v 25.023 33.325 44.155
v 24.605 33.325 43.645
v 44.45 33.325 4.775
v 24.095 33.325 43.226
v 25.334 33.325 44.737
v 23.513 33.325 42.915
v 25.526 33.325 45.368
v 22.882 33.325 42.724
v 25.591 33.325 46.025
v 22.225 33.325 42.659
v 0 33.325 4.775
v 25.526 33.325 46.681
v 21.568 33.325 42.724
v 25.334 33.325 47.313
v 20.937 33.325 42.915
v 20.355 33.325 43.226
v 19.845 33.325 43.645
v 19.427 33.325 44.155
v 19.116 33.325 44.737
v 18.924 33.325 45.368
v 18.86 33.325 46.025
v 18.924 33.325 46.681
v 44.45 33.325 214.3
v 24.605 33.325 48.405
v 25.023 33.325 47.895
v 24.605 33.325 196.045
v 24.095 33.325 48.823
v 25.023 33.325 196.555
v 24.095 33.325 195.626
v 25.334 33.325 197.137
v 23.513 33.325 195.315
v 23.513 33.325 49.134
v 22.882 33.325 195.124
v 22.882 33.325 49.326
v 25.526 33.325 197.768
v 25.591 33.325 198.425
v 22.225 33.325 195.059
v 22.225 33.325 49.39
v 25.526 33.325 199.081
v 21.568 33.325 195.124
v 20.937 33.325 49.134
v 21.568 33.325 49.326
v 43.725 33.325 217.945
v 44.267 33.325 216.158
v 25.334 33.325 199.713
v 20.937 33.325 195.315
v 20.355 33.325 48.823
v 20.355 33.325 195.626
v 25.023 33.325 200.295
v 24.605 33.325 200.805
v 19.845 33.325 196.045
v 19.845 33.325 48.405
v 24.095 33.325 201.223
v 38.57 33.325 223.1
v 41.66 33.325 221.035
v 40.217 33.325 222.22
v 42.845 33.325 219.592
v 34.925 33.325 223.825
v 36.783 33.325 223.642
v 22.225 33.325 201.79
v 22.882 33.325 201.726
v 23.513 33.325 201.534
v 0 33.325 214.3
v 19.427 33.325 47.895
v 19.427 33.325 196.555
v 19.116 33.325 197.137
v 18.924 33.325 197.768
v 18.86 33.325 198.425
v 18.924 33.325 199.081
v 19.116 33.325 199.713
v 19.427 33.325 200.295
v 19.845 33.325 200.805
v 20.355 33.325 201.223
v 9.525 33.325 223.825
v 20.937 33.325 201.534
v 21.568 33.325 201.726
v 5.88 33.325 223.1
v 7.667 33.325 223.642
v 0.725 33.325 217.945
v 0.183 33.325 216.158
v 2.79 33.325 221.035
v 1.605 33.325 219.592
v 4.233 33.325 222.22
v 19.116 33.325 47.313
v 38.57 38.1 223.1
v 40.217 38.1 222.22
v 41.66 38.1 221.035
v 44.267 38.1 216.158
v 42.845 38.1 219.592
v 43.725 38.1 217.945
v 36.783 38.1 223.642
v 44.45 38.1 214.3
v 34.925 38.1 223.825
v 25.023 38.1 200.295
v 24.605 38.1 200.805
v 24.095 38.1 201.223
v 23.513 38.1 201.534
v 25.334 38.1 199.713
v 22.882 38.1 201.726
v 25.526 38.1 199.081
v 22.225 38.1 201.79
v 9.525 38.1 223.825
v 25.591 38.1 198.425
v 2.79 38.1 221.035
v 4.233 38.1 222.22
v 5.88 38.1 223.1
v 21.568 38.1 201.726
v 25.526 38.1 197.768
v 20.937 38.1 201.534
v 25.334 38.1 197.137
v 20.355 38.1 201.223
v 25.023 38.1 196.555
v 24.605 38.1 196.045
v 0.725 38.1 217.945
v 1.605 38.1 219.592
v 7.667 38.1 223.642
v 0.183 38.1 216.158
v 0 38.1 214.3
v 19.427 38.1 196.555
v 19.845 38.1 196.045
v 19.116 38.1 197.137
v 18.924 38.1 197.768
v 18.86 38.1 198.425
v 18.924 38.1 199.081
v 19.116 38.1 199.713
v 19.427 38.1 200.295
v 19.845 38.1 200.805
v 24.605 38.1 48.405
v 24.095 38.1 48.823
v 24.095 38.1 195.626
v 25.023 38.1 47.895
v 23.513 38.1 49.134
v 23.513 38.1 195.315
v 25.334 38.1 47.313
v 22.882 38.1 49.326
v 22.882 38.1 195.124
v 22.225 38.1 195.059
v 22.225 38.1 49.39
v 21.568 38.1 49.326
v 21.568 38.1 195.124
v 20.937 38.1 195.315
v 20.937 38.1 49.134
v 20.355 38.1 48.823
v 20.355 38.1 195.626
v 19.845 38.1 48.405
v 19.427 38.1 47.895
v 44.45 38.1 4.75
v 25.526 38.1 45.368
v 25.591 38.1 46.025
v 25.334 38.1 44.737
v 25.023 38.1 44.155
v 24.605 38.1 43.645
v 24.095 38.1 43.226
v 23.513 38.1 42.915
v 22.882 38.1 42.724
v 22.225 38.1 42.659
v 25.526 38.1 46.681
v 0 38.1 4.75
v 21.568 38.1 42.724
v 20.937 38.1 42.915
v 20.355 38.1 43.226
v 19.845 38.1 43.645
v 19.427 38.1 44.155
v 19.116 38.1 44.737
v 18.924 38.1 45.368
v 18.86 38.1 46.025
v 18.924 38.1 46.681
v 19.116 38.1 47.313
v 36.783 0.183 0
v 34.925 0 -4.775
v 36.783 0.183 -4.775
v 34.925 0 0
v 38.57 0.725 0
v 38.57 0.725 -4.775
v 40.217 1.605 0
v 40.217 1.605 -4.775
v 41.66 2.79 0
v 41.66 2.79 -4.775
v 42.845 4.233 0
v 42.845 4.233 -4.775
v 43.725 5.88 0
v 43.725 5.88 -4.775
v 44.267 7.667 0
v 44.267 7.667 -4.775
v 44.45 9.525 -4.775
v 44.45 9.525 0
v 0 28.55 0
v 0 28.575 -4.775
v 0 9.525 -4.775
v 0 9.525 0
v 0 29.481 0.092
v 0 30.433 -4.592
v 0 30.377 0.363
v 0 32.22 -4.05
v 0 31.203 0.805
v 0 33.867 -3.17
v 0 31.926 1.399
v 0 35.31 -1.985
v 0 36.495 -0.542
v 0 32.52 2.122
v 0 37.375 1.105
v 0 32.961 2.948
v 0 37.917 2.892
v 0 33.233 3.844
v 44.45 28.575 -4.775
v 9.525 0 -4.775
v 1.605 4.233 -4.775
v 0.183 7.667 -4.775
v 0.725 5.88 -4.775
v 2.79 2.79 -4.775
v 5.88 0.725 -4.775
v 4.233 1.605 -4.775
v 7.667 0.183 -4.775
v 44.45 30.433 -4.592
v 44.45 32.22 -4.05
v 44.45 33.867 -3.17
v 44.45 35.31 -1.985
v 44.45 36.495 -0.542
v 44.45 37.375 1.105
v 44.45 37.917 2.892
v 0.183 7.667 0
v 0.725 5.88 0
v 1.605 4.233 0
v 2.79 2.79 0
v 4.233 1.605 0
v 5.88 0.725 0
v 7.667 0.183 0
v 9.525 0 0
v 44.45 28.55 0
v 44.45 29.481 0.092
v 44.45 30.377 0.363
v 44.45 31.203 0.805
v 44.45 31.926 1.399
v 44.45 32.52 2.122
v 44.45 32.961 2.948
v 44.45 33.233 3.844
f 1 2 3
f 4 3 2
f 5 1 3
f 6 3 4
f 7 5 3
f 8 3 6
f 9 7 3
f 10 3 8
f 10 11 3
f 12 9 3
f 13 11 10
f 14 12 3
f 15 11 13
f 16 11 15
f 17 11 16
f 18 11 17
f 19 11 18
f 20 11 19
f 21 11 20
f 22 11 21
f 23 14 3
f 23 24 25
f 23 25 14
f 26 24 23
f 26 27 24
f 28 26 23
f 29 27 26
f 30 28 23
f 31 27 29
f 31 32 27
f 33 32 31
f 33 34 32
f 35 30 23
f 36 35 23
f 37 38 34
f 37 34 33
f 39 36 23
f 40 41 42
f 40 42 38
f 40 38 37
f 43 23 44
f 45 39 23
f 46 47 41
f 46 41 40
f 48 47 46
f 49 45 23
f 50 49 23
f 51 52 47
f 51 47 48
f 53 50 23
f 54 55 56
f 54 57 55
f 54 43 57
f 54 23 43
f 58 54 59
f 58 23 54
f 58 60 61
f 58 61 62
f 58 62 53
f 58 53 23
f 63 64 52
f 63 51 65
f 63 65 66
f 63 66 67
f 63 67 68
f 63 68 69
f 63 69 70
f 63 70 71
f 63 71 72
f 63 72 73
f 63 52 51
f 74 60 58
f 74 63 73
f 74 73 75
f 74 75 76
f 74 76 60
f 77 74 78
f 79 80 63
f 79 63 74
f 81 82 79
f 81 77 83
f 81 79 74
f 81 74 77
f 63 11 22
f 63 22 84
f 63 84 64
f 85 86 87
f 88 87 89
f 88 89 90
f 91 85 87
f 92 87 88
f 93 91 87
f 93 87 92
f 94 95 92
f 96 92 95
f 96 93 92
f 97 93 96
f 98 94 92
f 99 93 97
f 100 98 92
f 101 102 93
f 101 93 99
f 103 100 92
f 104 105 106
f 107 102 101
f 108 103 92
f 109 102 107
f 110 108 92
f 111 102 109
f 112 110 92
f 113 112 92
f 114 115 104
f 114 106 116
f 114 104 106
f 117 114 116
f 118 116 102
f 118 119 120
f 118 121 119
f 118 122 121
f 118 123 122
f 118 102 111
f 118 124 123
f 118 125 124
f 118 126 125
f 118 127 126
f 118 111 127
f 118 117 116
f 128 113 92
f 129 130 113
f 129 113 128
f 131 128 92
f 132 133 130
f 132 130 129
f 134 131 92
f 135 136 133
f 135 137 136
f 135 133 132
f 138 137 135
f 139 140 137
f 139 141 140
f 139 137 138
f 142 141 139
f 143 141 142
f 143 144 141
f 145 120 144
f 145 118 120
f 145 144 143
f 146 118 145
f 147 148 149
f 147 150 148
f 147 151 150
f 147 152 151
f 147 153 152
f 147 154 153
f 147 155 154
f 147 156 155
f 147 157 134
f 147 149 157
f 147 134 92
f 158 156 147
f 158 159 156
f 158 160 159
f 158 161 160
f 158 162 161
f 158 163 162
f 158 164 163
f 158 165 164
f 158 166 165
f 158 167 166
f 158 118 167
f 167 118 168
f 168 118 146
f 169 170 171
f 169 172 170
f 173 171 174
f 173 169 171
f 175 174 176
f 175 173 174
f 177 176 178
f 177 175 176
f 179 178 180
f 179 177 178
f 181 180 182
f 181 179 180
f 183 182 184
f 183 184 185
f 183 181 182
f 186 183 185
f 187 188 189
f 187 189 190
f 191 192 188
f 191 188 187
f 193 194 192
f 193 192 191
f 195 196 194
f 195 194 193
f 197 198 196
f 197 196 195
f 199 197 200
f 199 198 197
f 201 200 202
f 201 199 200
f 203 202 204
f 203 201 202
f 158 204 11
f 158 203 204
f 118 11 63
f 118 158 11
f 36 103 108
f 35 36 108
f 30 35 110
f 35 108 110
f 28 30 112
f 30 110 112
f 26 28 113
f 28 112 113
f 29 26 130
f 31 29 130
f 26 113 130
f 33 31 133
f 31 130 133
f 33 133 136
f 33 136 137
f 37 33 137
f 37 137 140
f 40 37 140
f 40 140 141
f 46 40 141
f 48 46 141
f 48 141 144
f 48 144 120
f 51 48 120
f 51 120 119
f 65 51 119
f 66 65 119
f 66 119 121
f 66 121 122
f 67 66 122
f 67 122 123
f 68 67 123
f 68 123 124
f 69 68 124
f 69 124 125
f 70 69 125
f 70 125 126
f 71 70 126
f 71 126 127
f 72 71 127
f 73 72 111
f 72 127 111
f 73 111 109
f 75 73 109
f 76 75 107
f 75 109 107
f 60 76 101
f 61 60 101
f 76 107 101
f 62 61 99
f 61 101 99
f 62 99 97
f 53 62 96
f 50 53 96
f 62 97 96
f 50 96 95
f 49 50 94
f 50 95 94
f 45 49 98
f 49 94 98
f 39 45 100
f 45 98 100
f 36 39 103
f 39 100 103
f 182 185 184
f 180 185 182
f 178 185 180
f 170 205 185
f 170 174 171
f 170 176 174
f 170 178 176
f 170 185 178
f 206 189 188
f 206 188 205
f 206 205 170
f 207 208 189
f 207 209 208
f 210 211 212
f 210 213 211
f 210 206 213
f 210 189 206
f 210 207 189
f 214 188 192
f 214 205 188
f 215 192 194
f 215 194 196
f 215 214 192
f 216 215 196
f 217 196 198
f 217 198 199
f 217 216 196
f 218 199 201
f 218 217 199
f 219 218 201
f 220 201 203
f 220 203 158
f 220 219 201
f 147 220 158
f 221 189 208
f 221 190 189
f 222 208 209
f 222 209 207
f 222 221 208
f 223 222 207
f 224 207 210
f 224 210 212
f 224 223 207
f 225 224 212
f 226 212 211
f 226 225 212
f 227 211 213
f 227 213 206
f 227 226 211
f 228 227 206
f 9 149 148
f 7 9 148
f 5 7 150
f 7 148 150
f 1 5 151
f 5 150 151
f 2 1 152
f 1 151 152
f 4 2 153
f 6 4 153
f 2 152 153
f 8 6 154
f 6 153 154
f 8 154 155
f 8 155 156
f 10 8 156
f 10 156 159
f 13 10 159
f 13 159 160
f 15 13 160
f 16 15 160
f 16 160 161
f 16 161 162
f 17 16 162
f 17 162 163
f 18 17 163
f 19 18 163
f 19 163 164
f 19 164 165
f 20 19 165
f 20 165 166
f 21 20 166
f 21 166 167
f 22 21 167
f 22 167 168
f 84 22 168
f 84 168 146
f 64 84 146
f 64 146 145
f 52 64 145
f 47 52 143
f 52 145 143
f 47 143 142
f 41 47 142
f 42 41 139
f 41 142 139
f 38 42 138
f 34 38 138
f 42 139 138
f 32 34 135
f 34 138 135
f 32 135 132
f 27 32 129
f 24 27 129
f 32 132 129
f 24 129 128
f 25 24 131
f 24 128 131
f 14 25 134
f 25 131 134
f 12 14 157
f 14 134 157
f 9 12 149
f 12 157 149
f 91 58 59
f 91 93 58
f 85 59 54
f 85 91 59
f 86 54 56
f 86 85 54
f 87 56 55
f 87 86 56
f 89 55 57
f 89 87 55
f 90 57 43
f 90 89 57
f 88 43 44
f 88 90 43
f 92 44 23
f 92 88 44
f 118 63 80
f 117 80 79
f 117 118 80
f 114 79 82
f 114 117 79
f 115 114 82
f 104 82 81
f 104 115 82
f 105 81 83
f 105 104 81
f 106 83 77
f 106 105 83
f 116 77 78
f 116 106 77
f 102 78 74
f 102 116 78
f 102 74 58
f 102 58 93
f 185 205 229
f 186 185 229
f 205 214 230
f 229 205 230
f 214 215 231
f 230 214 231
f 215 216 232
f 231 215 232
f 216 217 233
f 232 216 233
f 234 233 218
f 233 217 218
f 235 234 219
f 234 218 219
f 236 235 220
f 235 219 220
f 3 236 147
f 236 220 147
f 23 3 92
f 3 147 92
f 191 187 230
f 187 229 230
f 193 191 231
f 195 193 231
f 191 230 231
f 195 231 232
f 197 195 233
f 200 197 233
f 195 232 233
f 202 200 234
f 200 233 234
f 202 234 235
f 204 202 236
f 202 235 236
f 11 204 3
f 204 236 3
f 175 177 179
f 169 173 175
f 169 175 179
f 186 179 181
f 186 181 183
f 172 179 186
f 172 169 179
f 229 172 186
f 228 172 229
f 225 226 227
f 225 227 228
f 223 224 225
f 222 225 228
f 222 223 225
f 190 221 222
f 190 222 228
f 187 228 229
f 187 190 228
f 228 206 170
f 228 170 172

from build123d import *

# Parameters (mm, degrees)
BOSS_EXTRUDE1_DEPTH = 44.45
FILLET1_R           = 4.7752
FILLET2_R           = 9.525
FILLET3_R           = 9.525
SKETCH2_R           = 3.3655
CUT_EXTRUDE1_DEPTH  = 39.1


with BuildPart() as part:
    # Sketch1 → Boss-Extrude1 (new body)
    with BuildSketch(Plane(origin=(0, 0, 0), x_dir=(0, 0, -1), z_dir=(1, 0, 0))):
        Polygon((0, 0), (0, 33.3248), (-223.8248, 33.3248), (-223.8248, 38.1), (4.7752, 38.1), (4.7752, 0), align=None)
    extrude(amount=BOSS_EXTRUDE1_DEPTH)

    # Fillet1
    fillet1_edges = [part.edges().sort_by_distance(p)[0] for p in [
        (22.225, 33.3248, 0),
    ]]
    fillet(fillet1_edges, radius=FILLET1_R)

    # Fillet2
    fillet2_edges = [part.edges().sort_by_distance(p)[0] for p in [
        (22.225, 38.1, -4.7752),
    ]]
    fillet(fillet2_edges, radius=FILLET2_R)

    # Fillet3
    fillet3_edges = [part.edges().sort_by_distance(p)[0] for p in [
        (44.45, 35.7124, 223.8248),
        (44.45, 0, -2.3876),
        (0, 35.7124, 223.8248),
        (0, 0, -2.3876),
    ]]
    fillet(fillet3_edges, radius=FILLET3_R)

    # Sketch2 → Cut-Extrude1 (cut, through all)
    with BuildSketch(Plane(origin=(0, 38.1, 0), x_dir=(1, 0, 0), z_dir=(0, 1, 0))):
        with Locations((22.225, -198.4248)):
            Circle(SKETCH2_R)
        with Locations((22.225, -46.0248)):
            Circle(SKETCH2_R)
    extrude(amount=-CUT_EXTRUDE1_DEPTH, mode=Mode.SUBTRACT)


solid = part.part
